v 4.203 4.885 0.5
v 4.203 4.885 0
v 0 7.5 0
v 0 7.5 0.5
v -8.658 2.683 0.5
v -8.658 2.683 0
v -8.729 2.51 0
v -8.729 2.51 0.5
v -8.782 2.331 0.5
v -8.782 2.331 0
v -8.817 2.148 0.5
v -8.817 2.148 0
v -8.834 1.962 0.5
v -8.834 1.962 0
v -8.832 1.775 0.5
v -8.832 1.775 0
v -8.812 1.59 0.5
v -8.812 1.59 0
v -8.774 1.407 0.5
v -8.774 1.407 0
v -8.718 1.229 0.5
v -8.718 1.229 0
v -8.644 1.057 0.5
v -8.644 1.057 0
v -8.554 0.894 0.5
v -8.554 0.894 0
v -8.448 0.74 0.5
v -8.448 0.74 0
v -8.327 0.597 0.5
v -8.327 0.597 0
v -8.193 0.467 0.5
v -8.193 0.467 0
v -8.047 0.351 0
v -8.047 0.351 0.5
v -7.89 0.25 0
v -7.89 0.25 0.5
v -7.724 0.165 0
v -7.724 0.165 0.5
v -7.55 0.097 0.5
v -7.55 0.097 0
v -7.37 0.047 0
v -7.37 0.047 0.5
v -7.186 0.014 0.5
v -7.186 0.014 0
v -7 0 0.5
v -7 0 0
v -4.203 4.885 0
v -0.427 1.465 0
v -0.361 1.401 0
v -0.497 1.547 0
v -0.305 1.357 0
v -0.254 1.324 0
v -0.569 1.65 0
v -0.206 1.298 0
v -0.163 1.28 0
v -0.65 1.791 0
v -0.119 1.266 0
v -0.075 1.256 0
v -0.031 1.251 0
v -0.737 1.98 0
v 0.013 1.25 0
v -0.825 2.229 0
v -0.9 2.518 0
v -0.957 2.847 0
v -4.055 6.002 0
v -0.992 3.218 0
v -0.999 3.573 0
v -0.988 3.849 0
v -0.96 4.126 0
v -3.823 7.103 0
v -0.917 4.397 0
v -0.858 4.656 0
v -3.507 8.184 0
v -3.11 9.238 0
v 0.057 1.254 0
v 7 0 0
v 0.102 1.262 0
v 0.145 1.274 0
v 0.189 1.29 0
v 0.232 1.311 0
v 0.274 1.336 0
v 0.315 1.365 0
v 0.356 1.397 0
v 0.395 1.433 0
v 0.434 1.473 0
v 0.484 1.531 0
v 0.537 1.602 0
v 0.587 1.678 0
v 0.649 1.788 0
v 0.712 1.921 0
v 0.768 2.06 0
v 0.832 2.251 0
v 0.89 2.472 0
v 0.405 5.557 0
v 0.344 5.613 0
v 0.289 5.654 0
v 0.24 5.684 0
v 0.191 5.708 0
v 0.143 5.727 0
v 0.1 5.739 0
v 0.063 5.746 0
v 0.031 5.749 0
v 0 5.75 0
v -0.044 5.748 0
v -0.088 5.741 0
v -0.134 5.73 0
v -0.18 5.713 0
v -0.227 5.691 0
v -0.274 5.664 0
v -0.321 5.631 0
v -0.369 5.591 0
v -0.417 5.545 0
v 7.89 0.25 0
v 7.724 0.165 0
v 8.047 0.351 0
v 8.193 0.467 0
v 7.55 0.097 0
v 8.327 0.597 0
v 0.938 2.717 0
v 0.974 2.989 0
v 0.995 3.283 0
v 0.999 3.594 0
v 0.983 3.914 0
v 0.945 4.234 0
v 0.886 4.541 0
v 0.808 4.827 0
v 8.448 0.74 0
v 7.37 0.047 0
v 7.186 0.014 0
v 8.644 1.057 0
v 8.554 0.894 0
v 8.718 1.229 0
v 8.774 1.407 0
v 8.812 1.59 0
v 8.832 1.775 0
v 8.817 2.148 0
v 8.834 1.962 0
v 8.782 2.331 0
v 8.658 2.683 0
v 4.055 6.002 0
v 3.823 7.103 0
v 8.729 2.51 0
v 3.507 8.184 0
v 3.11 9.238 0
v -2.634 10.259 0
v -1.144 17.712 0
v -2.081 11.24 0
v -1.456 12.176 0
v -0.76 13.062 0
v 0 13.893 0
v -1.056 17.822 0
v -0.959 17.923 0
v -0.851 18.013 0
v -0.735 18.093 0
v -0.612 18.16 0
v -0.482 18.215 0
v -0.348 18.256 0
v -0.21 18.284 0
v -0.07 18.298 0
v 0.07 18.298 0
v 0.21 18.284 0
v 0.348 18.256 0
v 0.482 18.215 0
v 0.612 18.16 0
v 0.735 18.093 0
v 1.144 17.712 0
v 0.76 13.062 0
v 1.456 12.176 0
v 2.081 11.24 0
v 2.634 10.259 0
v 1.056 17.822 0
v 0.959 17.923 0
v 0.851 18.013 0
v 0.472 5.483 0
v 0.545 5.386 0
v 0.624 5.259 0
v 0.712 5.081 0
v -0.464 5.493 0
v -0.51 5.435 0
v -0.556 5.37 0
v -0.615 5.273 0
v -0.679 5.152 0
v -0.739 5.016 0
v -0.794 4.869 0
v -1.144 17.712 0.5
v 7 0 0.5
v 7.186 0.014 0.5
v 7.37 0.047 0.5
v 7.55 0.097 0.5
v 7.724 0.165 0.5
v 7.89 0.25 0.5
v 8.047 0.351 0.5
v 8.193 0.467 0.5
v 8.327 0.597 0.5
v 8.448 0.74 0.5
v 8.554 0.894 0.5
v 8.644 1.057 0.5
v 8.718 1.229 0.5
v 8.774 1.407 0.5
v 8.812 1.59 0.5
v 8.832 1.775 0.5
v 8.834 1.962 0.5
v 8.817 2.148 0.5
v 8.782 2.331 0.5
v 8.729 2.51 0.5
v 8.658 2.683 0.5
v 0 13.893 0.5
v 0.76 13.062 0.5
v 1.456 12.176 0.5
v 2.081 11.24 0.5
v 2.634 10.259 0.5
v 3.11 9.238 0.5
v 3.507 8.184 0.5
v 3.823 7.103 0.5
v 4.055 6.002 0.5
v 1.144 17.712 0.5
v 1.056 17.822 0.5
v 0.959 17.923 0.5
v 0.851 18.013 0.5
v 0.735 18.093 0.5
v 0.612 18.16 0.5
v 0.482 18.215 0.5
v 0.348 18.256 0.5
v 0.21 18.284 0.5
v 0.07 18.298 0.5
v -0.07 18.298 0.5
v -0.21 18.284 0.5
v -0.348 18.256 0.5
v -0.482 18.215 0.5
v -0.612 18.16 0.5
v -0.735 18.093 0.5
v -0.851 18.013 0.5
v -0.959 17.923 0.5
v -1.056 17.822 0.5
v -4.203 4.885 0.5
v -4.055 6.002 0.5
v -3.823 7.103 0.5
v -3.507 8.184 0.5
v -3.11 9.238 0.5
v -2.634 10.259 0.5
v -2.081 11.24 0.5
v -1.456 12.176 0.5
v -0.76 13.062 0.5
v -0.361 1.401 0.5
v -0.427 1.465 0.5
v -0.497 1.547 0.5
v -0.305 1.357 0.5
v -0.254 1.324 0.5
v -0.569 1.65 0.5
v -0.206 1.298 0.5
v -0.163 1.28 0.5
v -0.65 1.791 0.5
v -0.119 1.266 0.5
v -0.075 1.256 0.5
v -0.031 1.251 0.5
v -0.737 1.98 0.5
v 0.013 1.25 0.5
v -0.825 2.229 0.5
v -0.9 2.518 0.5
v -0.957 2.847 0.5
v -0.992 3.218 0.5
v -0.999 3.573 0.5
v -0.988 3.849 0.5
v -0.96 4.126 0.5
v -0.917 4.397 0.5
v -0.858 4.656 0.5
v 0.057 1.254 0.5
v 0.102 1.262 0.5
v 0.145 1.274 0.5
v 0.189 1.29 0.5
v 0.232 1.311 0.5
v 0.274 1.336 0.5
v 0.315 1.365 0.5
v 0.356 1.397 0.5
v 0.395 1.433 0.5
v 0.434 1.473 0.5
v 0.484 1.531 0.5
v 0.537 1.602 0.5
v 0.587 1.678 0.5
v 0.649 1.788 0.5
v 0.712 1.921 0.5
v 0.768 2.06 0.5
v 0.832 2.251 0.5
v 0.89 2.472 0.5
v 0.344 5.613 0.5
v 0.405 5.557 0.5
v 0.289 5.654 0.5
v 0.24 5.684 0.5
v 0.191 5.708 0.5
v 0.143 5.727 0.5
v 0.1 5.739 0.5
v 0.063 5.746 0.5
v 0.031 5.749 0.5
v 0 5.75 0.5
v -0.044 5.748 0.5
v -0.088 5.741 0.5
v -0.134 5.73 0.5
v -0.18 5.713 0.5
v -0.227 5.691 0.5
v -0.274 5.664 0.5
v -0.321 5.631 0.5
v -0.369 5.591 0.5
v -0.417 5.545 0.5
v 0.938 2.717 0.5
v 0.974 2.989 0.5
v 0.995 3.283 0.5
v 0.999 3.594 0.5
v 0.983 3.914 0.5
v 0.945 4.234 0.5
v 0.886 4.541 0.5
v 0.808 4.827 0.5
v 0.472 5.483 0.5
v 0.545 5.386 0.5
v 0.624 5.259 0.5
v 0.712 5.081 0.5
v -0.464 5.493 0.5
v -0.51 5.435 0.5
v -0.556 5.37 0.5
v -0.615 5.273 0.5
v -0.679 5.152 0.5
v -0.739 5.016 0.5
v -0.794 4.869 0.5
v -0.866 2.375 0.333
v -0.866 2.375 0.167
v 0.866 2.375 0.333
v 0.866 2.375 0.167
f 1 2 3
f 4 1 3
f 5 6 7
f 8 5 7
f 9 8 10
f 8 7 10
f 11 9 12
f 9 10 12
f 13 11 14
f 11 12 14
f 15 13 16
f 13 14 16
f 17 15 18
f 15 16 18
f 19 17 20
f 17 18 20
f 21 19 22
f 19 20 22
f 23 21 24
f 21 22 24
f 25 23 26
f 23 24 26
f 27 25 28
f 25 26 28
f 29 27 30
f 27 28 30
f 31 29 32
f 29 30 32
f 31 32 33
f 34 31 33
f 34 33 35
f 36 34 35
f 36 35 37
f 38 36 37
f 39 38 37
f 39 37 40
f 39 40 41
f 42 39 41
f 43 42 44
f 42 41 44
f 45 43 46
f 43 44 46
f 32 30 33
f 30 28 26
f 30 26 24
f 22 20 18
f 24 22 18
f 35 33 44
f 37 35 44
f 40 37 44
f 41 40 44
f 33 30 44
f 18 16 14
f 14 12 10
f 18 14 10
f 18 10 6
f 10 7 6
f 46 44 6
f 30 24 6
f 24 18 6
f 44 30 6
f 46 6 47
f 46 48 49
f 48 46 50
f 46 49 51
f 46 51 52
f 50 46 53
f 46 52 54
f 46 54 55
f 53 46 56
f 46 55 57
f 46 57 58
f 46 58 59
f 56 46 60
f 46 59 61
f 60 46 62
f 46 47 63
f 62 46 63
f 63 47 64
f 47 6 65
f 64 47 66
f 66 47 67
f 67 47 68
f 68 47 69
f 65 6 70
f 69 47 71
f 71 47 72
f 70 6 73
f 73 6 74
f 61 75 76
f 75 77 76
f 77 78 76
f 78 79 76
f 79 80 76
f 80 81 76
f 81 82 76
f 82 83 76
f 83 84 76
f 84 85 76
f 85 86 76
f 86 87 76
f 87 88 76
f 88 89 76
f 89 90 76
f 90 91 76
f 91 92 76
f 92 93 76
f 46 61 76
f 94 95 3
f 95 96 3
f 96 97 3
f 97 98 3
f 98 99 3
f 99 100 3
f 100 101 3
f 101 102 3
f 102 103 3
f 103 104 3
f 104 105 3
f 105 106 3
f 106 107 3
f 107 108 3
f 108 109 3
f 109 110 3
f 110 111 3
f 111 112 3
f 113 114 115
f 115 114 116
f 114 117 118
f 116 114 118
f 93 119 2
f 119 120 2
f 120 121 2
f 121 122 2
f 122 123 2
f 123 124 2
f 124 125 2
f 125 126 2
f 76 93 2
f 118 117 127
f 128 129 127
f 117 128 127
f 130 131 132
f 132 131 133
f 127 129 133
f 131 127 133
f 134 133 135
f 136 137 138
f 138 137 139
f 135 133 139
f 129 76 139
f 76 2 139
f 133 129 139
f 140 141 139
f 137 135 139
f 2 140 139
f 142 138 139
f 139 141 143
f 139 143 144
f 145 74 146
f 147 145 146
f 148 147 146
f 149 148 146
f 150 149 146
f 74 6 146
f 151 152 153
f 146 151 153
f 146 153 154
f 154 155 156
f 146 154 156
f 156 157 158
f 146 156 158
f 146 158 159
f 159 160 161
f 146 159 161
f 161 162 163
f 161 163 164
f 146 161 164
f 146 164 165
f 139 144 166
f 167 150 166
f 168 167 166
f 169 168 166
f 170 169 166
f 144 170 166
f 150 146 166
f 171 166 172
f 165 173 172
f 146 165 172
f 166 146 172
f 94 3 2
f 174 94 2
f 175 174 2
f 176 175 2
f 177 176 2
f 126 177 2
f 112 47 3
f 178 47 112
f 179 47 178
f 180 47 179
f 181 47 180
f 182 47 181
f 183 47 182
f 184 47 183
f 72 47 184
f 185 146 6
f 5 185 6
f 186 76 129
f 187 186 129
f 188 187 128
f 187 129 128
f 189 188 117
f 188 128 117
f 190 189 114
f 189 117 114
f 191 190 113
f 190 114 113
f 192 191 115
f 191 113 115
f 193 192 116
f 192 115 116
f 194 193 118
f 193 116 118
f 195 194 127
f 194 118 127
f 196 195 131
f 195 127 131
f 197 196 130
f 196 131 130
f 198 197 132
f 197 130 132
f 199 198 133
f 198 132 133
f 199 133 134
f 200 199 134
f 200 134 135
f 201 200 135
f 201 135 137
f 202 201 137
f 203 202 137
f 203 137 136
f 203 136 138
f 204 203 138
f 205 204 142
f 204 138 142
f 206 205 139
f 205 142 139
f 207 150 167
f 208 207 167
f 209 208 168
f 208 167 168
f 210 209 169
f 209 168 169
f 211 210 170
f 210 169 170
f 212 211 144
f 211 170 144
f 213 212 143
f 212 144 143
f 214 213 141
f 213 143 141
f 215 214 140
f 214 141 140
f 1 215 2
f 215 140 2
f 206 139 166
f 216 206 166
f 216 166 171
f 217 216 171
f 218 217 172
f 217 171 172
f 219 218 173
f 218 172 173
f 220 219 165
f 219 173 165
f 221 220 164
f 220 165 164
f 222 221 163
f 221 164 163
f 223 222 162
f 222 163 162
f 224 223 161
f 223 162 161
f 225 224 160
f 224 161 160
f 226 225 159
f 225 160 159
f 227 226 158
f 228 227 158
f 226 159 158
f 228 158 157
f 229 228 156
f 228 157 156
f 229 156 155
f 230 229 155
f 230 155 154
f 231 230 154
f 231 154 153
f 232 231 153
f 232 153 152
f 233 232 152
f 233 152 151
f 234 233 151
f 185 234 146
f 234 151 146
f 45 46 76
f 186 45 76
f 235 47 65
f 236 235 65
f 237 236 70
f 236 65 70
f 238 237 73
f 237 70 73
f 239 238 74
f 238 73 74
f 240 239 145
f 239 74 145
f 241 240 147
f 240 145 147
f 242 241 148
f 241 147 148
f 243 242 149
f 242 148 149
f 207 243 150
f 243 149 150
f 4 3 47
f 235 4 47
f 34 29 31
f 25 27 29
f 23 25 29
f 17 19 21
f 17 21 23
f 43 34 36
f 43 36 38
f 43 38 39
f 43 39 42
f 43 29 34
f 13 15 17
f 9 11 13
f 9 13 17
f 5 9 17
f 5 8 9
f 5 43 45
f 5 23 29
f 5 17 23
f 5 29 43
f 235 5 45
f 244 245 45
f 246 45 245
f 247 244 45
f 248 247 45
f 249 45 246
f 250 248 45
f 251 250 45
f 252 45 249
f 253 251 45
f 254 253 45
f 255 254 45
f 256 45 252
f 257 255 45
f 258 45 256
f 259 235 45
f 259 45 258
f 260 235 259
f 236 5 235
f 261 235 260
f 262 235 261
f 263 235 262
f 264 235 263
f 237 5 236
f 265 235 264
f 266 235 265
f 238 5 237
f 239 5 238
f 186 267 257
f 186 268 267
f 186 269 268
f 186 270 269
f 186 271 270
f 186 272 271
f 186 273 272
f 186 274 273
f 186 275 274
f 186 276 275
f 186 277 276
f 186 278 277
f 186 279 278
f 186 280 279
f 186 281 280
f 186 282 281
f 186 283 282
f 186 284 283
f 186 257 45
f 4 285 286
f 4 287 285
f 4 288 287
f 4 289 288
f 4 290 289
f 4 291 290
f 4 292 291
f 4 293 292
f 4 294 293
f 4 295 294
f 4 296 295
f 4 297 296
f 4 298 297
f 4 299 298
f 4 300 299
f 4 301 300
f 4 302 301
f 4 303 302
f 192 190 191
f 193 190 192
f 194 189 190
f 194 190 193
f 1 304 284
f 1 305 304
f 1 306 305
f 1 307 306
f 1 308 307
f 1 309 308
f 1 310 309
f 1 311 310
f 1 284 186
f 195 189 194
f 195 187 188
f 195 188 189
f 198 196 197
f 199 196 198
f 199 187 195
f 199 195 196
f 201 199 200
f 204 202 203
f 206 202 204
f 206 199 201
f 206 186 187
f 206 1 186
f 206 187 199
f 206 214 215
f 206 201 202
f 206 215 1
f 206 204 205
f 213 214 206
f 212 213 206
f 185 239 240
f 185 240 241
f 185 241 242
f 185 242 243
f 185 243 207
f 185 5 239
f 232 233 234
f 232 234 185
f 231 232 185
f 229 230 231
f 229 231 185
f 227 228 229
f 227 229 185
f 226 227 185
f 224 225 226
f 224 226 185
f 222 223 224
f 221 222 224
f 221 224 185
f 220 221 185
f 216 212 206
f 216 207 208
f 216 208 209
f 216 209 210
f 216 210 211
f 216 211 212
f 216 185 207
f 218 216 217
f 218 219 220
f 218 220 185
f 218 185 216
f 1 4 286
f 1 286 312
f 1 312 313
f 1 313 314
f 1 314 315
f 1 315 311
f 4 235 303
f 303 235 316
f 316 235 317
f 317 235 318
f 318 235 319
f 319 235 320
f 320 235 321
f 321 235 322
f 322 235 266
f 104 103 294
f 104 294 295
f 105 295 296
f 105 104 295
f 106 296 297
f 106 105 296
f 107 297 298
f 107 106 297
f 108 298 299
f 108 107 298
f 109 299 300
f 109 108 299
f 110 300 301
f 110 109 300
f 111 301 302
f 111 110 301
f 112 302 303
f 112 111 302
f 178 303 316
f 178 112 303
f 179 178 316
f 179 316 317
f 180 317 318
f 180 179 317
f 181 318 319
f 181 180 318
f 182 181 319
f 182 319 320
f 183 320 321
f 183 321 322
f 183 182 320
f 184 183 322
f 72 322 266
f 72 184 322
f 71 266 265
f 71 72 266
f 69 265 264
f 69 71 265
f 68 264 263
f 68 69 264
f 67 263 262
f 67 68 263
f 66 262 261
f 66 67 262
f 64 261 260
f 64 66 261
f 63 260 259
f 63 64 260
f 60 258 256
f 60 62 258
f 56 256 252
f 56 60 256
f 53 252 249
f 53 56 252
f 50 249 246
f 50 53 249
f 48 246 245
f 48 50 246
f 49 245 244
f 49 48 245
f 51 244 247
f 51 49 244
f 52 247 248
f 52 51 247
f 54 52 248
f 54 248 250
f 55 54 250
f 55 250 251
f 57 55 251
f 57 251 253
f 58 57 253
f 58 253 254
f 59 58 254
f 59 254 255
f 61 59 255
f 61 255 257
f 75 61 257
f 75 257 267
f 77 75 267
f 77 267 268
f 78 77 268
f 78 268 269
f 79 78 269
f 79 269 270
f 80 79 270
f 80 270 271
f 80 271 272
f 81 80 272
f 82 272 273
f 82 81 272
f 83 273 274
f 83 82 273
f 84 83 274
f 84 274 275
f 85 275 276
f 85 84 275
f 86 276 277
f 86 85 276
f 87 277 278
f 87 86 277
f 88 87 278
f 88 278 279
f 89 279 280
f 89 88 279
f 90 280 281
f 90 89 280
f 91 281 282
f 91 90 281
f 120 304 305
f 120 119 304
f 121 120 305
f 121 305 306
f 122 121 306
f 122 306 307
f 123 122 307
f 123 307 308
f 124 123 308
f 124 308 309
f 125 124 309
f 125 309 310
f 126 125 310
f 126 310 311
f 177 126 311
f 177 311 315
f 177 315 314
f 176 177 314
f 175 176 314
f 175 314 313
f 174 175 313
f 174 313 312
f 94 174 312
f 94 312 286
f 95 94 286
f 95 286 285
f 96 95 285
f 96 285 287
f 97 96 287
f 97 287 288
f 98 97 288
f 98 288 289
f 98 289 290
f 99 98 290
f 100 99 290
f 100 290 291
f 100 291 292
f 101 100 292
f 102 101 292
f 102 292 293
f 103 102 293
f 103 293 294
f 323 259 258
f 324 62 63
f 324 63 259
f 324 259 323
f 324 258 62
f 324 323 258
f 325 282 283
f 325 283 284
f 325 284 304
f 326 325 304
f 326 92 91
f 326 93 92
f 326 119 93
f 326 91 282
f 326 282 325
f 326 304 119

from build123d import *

# Parameters (mm, degrees)
F1_DEPTH = 0.5


with BuildPart() as f1:
    # F0 (on Top) → F1 (new body)
    with BuildSketch(Plane.XY):
        with BuildLine():
            Line((8.658359, 2.683282), (1.341641, 17.316718))
            Line((1.341641, 17.316718), (1.143914, 17.712172))
            ThreePointArc((1.143914, 17.712172), (0, 18.3), (-1.143914, 17.712172))
            Line((-1.143914, 17.712172), (-1.341641, 17.316718))
            Line((-1.341641, 17.316718), (-8.658359, 2.683282))
            ThreePointArc((-8.658359, 2.683282), (-8.553894, 0.893743), (-7, 0))
            Line((-7, 0), (7, 0))
            ThreePointArc((7, 0), (8.553894, 0.893743), (8.658359, 2.683282))
        make_face()
        with BuildLine():
            add(Edge.make_bspline(
                [(0, 5.75), (-1.732051, 5.75), (-0.866025, 2.375), (0, -1), (0.866025, 2.375), (1.732051, 5.75), (0, 5.75)],
                knots=[0, 0, 0, 2.094395, 2.094395, 4.18879, 4.18879, 6.283185, 6.283185, 6.283185], degree=2, weights=[1, 0.5, 1, 0.5, 1, 0.5, 1]))
        make_face(mode=Mode.SUBTRACT)
        with BuildLine():
            ThreePointArc((0, 13.893057), (2.881392, 9.752982), (4.203293, 4.885209))
            Line((4.203293, 4.885209), (0, 7.5))
            Line((0, 7.5), (-4.203293, 4.885209))
            ThreePointArc((-4.203293, 4.885209), (-2.881392, 9.752982), (0, 13.893057))
        make_face(mode=Mode.SUBTRACT)
    extrude(amount=F1_DEPTH)


solid = f1.part
